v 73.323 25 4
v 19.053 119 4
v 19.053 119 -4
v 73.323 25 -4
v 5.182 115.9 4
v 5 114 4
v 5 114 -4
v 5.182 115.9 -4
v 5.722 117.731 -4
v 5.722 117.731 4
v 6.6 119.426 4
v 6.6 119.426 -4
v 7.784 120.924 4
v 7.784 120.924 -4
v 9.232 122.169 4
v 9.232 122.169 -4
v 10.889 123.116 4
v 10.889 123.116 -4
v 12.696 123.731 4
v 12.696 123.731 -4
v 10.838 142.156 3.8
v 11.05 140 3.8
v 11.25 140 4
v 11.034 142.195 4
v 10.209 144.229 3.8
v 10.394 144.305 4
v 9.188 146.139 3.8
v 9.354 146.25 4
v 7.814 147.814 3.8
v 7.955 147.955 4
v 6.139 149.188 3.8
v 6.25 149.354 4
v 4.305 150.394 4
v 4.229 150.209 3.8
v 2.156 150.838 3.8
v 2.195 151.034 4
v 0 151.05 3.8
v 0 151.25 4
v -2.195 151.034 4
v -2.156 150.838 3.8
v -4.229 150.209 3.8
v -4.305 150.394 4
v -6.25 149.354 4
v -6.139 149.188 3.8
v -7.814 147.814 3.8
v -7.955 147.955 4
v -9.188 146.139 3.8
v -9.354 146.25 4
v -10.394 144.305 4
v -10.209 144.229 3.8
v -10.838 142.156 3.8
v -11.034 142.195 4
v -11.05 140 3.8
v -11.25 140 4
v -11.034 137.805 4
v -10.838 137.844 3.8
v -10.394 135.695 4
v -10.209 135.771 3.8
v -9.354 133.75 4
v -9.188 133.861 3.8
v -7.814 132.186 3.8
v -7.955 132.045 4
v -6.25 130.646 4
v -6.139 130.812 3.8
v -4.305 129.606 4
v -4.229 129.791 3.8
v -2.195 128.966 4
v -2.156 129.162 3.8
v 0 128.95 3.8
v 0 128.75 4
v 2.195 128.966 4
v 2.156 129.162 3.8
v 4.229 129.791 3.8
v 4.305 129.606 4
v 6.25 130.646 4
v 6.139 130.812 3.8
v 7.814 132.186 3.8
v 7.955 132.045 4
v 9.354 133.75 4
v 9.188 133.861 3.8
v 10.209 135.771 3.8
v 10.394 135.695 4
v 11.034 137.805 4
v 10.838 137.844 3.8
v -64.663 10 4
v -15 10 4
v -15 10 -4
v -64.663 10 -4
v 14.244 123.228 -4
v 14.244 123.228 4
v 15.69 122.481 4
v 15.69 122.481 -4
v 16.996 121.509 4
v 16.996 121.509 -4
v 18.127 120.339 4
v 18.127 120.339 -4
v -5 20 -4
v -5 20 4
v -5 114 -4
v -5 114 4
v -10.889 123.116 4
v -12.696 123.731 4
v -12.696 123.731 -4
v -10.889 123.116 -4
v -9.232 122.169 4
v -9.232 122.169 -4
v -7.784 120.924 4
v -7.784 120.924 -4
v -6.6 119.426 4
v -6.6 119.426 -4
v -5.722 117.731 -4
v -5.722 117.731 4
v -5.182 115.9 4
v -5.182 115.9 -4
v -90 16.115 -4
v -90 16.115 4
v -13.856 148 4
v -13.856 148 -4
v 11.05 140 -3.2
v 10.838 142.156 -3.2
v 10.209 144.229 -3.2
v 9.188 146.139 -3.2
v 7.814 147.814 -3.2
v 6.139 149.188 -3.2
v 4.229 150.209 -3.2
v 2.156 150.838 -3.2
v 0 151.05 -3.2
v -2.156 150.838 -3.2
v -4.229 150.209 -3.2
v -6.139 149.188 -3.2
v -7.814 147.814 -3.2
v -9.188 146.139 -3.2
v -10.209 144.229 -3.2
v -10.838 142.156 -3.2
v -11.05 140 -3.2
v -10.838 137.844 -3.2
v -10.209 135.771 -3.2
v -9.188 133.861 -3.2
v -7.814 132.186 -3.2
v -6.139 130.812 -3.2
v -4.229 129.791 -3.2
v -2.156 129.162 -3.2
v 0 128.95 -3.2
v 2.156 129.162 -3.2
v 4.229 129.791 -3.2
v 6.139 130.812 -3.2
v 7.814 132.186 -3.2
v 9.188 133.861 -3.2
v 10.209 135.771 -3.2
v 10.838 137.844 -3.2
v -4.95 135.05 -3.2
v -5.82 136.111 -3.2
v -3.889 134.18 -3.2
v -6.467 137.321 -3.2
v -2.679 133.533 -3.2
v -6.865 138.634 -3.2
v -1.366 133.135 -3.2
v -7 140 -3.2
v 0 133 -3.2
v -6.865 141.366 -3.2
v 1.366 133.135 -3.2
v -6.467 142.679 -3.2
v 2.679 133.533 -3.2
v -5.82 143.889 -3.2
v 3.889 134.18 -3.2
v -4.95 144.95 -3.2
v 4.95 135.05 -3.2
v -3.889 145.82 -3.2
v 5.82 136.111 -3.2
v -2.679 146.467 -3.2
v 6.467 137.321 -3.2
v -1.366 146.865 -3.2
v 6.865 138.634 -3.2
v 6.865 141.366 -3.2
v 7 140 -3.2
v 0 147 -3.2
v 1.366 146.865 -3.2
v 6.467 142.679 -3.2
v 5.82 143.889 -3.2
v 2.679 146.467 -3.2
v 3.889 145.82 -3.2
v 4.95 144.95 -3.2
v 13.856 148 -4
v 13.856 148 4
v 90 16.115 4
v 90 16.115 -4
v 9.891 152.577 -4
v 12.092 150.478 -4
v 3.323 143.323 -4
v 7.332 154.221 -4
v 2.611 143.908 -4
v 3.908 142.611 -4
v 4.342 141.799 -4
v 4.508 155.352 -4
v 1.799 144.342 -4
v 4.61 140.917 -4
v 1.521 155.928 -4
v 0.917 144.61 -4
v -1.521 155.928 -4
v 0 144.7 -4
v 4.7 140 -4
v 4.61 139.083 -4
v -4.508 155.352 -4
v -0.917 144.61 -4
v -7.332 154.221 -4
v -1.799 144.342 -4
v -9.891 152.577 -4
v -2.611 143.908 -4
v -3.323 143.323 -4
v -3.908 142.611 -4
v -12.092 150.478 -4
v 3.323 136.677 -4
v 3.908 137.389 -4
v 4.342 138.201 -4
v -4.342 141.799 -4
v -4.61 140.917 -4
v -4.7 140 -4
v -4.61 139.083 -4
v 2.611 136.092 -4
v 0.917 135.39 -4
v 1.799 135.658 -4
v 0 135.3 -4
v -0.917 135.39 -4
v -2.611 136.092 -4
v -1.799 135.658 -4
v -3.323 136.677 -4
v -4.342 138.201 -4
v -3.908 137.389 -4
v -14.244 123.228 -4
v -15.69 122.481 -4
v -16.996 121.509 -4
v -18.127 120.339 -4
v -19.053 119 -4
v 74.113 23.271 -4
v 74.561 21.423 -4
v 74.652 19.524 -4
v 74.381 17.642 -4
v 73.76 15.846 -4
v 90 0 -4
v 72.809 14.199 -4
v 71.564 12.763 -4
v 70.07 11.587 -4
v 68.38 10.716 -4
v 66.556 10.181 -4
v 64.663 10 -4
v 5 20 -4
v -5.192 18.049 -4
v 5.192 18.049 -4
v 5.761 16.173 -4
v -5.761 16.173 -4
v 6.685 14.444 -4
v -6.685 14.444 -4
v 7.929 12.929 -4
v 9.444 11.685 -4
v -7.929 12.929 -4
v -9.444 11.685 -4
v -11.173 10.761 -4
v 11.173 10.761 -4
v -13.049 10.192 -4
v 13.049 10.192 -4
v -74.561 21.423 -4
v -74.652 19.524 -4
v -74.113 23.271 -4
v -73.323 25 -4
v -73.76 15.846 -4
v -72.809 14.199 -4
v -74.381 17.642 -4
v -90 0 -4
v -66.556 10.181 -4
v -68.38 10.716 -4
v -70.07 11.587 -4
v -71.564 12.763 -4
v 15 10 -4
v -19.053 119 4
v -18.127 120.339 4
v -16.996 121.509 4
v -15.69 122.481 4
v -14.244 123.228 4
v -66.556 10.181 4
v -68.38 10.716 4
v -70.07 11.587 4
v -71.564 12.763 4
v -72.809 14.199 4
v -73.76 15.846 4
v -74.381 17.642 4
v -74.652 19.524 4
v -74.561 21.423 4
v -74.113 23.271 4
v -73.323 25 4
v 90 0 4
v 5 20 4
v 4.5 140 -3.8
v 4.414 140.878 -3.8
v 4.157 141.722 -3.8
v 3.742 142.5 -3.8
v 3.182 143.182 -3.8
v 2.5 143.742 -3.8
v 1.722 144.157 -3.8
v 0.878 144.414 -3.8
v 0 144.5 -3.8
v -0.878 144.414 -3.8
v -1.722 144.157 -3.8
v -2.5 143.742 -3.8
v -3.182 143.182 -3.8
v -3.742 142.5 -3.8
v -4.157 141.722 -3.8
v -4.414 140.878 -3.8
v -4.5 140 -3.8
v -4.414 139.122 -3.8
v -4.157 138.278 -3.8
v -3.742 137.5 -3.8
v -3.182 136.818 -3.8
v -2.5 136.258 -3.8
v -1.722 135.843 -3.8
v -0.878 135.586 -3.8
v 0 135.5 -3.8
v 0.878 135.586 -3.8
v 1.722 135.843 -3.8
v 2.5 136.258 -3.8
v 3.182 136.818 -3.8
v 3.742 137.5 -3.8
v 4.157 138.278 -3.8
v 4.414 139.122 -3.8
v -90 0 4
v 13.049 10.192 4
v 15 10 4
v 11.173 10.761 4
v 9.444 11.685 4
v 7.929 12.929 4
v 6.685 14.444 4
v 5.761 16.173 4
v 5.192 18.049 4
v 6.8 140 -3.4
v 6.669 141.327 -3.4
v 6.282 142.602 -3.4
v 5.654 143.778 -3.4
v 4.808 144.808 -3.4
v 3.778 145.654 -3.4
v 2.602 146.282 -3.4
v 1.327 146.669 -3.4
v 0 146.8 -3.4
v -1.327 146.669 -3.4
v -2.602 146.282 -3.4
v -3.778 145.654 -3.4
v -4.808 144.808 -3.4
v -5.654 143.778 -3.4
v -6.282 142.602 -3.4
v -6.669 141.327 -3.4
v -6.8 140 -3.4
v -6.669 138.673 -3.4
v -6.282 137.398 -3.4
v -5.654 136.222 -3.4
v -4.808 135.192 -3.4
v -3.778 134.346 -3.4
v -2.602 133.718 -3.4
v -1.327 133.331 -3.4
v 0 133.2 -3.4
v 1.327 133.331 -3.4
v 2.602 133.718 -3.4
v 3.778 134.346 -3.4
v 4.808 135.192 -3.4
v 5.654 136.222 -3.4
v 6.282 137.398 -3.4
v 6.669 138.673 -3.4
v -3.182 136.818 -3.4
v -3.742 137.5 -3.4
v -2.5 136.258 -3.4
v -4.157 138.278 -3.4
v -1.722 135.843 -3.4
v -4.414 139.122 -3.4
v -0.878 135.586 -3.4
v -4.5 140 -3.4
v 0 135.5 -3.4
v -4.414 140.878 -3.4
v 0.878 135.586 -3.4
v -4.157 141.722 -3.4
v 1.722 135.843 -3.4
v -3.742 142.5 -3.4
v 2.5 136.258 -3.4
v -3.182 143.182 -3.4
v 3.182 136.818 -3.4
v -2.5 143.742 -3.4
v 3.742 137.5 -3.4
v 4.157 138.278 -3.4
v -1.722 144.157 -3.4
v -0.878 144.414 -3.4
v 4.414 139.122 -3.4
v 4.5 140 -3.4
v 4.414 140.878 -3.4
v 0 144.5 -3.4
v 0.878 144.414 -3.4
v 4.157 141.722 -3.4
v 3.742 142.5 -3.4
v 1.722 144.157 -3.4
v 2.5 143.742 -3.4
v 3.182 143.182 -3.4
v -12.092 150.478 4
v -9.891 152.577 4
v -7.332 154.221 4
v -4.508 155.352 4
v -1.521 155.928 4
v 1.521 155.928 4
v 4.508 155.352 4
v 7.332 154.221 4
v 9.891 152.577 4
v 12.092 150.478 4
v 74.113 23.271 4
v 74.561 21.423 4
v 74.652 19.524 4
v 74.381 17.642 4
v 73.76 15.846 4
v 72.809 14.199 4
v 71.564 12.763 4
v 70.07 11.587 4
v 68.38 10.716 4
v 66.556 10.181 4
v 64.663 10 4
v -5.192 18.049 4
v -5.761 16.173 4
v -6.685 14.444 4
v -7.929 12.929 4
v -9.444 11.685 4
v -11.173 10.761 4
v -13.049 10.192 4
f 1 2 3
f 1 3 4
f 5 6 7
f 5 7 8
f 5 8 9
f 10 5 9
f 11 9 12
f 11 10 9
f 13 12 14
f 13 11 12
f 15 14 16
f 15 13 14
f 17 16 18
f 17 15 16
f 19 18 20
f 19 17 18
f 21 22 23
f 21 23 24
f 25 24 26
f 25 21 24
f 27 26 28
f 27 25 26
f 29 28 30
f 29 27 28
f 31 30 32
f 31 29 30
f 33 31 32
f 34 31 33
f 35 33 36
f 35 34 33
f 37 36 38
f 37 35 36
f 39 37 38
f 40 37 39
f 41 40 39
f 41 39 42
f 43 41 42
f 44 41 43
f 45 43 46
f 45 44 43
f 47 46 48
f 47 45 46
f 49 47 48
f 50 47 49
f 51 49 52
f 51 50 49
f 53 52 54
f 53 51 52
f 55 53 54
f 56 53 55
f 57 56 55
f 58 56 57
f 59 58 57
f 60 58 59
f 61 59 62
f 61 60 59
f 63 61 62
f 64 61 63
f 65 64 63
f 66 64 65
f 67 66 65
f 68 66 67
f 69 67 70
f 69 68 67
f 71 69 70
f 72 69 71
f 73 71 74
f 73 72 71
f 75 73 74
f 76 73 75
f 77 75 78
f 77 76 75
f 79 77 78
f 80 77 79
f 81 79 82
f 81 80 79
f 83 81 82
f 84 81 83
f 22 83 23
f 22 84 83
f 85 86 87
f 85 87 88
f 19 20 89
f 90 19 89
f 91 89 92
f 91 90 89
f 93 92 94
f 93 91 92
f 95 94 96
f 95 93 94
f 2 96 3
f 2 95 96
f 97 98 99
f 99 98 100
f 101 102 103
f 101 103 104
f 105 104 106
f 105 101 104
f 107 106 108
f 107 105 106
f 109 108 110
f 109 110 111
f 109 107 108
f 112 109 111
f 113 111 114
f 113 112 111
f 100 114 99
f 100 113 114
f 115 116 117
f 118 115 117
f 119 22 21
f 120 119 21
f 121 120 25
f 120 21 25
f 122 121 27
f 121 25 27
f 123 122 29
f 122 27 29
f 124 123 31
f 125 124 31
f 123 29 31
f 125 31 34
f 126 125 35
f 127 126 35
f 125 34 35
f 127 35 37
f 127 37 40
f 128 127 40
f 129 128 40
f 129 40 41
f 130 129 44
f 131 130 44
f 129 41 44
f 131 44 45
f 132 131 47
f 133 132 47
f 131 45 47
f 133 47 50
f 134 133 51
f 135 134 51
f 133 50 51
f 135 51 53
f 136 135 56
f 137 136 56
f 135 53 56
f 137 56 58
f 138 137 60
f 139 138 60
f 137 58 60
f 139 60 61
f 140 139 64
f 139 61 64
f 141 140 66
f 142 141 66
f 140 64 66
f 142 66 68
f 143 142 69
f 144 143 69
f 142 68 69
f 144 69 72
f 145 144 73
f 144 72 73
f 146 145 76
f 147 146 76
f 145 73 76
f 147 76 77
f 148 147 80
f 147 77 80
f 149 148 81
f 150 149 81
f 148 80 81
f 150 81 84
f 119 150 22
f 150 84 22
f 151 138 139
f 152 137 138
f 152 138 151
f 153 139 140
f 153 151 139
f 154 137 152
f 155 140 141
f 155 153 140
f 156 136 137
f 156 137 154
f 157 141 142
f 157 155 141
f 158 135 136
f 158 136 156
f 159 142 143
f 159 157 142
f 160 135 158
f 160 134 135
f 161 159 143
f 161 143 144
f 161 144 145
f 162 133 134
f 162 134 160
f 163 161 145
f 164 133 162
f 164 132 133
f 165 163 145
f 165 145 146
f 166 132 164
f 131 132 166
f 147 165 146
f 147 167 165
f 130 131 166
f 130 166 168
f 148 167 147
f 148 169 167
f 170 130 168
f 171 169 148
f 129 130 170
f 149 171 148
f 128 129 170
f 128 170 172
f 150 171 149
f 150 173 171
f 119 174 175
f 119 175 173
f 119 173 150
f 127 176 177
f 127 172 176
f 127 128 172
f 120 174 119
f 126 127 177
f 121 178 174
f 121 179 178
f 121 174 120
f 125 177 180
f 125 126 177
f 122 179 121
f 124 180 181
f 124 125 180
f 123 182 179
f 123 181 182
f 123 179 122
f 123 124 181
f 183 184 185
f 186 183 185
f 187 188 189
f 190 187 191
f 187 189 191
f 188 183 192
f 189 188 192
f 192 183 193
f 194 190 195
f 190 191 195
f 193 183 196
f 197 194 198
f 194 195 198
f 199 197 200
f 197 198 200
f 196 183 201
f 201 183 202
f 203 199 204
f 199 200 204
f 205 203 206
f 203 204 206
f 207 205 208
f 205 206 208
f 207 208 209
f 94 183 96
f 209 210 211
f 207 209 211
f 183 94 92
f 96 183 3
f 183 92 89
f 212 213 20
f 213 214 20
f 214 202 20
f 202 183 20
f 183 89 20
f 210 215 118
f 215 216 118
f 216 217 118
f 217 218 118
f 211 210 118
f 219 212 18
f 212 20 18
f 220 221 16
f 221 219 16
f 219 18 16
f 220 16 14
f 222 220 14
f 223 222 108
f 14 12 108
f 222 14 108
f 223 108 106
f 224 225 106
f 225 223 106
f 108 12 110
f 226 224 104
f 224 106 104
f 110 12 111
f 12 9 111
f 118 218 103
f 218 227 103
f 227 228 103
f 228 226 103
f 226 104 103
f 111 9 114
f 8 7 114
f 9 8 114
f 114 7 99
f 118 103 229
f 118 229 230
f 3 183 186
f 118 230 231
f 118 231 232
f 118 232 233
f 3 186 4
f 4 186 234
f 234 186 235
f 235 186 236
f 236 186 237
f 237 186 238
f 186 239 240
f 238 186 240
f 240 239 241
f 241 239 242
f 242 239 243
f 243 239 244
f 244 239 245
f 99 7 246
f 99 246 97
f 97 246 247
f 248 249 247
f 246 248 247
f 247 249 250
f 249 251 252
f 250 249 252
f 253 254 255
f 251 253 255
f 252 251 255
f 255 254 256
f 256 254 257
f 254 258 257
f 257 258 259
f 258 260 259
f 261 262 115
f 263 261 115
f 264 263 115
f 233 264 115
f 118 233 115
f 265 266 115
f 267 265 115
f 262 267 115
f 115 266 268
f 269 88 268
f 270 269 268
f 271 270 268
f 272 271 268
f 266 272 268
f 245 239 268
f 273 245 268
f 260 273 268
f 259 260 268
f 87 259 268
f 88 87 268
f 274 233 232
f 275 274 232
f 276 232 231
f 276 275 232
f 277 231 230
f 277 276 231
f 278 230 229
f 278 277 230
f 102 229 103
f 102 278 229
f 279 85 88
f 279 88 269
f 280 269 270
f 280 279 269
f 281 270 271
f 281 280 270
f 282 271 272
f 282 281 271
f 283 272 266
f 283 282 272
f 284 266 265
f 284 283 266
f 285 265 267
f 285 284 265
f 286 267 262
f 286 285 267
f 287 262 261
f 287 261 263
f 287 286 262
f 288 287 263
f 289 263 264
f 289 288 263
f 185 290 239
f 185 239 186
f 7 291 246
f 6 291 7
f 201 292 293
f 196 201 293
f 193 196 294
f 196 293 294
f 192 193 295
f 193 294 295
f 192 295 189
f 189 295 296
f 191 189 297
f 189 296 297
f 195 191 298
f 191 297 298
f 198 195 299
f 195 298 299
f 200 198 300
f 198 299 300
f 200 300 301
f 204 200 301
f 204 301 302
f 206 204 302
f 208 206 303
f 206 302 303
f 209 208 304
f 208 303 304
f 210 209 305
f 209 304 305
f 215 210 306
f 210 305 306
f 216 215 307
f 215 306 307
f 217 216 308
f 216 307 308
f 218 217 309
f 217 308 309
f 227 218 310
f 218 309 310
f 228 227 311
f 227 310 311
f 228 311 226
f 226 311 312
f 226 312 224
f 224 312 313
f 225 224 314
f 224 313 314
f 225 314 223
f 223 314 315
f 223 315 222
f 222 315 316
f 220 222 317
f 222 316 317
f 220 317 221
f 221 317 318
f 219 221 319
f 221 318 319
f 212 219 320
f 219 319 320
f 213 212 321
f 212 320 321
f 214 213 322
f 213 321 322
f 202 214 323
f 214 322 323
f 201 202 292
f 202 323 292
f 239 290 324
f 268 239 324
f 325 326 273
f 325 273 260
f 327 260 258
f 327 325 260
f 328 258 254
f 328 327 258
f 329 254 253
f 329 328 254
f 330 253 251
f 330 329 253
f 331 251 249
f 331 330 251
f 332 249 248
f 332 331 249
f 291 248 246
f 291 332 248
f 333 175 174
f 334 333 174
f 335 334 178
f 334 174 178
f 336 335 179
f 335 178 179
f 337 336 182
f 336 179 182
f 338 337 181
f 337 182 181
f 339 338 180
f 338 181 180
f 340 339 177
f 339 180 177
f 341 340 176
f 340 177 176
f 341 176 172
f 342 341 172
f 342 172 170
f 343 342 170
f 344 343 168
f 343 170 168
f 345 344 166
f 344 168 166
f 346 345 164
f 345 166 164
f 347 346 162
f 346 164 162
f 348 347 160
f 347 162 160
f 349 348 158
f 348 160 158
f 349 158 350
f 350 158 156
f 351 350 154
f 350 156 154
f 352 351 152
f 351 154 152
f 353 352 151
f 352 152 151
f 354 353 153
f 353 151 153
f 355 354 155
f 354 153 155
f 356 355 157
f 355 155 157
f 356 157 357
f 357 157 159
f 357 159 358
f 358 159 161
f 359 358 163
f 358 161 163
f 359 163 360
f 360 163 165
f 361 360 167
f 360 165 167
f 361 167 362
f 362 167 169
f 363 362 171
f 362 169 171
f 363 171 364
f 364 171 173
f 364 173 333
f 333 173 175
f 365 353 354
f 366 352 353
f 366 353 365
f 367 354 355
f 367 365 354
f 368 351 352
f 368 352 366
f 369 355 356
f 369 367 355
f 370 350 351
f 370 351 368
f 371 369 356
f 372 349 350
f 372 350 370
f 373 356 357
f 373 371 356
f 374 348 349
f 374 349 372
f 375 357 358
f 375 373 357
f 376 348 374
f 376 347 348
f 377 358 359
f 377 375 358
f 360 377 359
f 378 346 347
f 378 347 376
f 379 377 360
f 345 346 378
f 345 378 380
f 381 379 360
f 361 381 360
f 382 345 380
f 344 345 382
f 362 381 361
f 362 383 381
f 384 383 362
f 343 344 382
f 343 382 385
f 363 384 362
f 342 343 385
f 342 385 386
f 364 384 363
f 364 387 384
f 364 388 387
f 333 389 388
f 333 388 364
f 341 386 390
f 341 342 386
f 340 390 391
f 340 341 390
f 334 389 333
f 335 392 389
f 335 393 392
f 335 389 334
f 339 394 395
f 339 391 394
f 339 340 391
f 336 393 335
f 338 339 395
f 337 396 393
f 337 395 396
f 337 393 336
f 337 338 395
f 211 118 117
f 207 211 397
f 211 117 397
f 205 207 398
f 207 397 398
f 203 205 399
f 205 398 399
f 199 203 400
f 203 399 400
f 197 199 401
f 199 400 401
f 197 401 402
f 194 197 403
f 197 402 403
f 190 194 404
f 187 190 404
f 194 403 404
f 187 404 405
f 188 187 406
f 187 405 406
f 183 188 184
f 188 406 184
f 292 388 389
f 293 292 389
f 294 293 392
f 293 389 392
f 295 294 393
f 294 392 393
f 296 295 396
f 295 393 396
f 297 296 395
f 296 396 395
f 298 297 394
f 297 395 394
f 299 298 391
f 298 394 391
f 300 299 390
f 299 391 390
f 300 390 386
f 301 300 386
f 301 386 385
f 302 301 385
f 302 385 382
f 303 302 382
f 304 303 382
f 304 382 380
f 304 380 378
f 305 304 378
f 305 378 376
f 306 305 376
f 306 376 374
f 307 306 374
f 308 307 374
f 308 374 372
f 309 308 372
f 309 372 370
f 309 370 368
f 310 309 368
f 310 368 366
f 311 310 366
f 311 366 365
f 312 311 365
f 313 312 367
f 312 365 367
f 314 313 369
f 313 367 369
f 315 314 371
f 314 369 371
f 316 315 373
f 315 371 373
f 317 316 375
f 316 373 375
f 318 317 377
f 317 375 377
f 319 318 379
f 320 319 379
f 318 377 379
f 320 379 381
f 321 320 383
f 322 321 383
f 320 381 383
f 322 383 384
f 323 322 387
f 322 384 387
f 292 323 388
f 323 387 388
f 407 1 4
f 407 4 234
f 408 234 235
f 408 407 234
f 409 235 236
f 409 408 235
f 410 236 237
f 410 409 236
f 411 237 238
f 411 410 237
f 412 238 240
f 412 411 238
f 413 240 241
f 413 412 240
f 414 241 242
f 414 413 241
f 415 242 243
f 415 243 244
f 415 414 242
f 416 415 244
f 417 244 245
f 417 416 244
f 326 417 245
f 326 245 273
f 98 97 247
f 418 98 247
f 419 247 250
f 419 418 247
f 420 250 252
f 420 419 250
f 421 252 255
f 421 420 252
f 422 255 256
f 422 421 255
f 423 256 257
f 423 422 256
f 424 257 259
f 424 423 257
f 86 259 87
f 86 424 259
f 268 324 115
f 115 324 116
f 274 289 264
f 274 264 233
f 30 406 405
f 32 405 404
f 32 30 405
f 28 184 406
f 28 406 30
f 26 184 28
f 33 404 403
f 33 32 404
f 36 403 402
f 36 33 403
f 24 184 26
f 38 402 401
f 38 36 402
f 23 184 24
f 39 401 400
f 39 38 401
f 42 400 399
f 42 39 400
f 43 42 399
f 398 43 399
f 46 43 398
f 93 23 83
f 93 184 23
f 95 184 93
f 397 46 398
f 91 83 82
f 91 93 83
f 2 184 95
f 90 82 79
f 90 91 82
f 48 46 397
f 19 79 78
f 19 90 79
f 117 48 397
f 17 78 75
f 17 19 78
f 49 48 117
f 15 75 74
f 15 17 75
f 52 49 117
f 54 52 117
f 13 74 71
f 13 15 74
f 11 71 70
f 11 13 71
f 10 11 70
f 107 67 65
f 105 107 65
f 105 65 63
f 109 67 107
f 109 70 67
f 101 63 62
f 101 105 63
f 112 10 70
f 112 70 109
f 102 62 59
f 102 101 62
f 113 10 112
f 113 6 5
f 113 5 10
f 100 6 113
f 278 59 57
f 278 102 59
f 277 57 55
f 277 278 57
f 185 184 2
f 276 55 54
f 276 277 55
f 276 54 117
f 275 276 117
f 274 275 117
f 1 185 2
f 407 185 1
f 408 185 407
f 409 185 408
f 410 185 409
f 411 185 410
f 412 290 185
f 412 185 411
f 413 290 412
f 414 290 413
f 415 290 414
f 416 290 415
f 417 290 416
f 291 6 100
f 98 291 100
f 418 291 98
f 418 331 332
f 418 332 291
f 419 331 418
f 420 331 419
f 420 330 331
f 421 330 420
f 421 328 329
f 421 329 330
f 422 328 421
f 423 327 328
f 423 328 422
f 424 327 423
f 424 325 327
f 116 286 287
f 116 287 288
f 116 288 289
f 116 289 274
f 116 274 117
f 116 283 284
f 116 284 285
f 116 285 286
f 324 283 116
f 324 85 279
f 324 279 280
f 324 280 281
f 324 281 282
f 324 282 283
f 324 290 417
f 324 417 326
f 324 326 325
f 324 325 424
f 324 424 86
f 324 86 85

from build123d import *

# Parameters (mm, degrees)
BOSS_EXTRUDE1_DEPTH = 4
SKETCH2_R           = 11.05
CUT_EXTRUDE1_DEPTH  = 7.2
SKETCH3_R           = 7
CUT_EXTRUDE2_DEPTH  = 0.2
SKETCH4_R           = 4.5
CUT_EXTRUDE3_DEPTH  = 186.073210739
CHAMFER1_SIZE       = 0.2
CUT_EXTRUDE4_DEPTH  = 186.09817215
SKETCH8_W           = 10
SKETCH8_H           = 114
EXTRUDE_THIN1_DEPTH = 8
FILLET1_R           = 10
SKETCH6_OUTSIDE_W   = 251.144
SKETCH6_OUTSIDE_H   = 208.536
SKETCH6_OUTSIDE_W_2 = 180
SKETCH6_OUTSIDE_H_2 = 156
CUT_EXTRUDE5_DEPTH  = 186.09817215


# Some blends are built 0.0001 mm under size
with BuildPart() as part:
    # Sketch1 → Boss-Extrude1 (new, symmetric)
    with BuildSketch(Plane.XY):
        with BuildLine():
            Line((0, 0), (-99.304246301, 0))
            Line((-99.304246301, 0), (-13.856406461, 148))
            ThreePointArc((-13.856406461, 148), (0, 156), (13.856406461, 148))
            Line((13.856406461, 148), (99.304246301, 0))
            Line((99.304246301, 0), (0, 0))
        make_face()
    extrude(amount=BOSS_EXTRUDE1_DEPTH, both=True)

    # Sketch2 → Cut-Extrude1 (cut)
    with BuildSketch(Plane.XY.offset(4)):
        with Locations((0, 140)):
            Circle(SKETCH2_R)
    extrude(amount=-CUT_EXTRUDE1_DEPTH, mode=Mode.SUBTRACT)

    # Sketch3 → Cut-Extrude2 (cut)
    with BuildSketch(Plane.XY.offset(-3.2)):
        with Locations((0, 140)):
            Circle(SKETCH3_R)
    extrude(amount=-CUT_EXTRUDE2_DEPTH, mode=Mode.SUBTRACT)

    # Sketch4 → Cut-Extrude3 (cut, through all)
    with BuildSketch(Plane.XY.offset(-3.4)):
        with Locations((0, 140)):
            Circle(SKETCH4_R)
    extrude(amount=-CUT_EXTRUDE3_DEPTH, mode=Mode.SUBTRACT)

    # Chamfer1
    chamfer1_edges = [part.edges().sort_by_distance(p)[0] for p in [
        (-11.05, 140, 4),
        (-7, 140, -3.4),
        (-4.5, 140, -4),
    ]]
    chamfer(chamfer1_edges, length=CHAMFER1_SIZE - 0.0001)  # a hair under: the kernel refuses the full size

    # Sketch5 → Cut-Extrude4 (cut, through all)
    with BuildSketch(Plane.XY.offset(4)):
        Polygon((-16.165807537, 124), (16.165807537, 124), (81.983738225, 10), (-81.983738225, 10), align=None)
    extrude(amount=-CUT_EXTRUDE4_DEPTH, mode=Mode.SUBTRACT)

    # Sketch8 → Extrude-Thin1 (add)
    with BuildSketch(Plane.XY.offset(4)):
        with Locations((0, 67)):
            Rectangle(SKETCH8_W, SKETCH8_H)
    extrude(amount=-EXTRUDE_THIN1_DEPTH)

    # Fillet1
    # the kernel refuses this fillet: 10 mm, written as the material it adds along each edge
    with BuildSketch(Plane(origin=(81.983738225, 10, 4), x_dir=(-0.5000000000000037, 0.8660254037844365, 0), z_dir=(0, 0, -1)), Plane(origin=(-81.983738225, 10, 4), x_dir=(1, 0, 0), z_dir=(0, 0, -1))) as fillet1_piece_1:
        with BuildLine():
            CenterArc((FILLET1_R * 1.73205080757, -FILLET1_R), FILLET1_R, 90, 120)
            Line((FILLET1_R * 0.866025403784, -FILLET1_R * 1.5), (0, 0))
            Line((0, 0), (FILLET1_R * 1.73205080757, 0))
        make_face()
    extrude(amount=8)
    with BuildSketch(Plane(origin=(16.165807537, 124, 4), x_dir=(-1, 0, 0), z_dir=(0, 0, -1))) as fillet1_piece_2:
        with BuildLine():
            CenterArc((FILLET1_R * 0.57735026919, -FILLET1_R), FILLET1_R, 90, 60)
            Line((-FILLET1_R * 0.288675134595, -FILLET1_R * 0.5), (0, 0))
            Line((0, 0), (FILLET1_R * 0.57735026919, 0))
        make_face()
    extrude(amount=8)
    with BuildSketch(Plane(origin=(-16.165807537, 124, 4), x_dir=(1, 0, 0), z_dir=(0, 0, -1))) as fillet1_piece_3:
        with BuildLine():
            CenterArc((FILLET1_R * 0.57735026919, FILLET1_R), FILLET1_R, 210, 60)
            Line((-FILLET1_R * 0.288675134595, FILLET1_R * 0.5), (0, 0))
            Line((0, 0), (FILLET1_R * 0.57735026919, 0))
        make_face()
    extrude(amount=8)
    with BuildSketch(Plane(origin=(-5, 10, 4), x_dir=(-1, 0, 0), z_dir=(0, 0, -1)), Plane(origin=(5, 124, 4), x_dir=(1, 0, 0), z_dir=(0, 0, -1))) as fillet1_piece_4:
        with BuildLine():
            CenterArc((FILLET1_R, FILLET1_R), FILLET1_R, 180, 90)
            Line((0, FILLET1_R), (0, 0))
            Line((0, 0), (FILLET1_R, 0))
        make_face()
    extrude(amount=8)
    with BuildSketch(Plane(origin=(5, 10, 4), x_dir=(1, 0, 0), z_dir=(0, 0, -1)), Plane(origin=(-5, 124, 4), x_dir=(-1, 0, 0), z_dir=(0, 0, -1))) as fillet1_piece_5:
        with BuildLine():
            CenterArc((FILLET1_R, -FILLET1_R), FILLET1_R, 90, 90)
            Line((0, -FILLET1_R), (0, 0))
            Line((0, 0), (FILLET1_R, 0))
        make_face()
    extrude(amount=8)

    # Sketch6 outside → Cut-Extrude5 (cut, through all)
    with BuildSketch(Plane.XY.offset(4)):
        with Locations((0, 78)):
            Rectangle(SKETCH6_OUTSIDE_W, SKETCH6_OUTSIDE_H)
        with Locations((0, 78)):
            Rectangle(SKETCH6_OUTSIDE_W_2, SKETCH6_OUTSIDE_H_2, mode=Mode.SUBTRACT)
    extrude(amount=-CUT_EXTRUDE5_DEPTH, mode=Mode.SUBTRACT)


solid = part.part
